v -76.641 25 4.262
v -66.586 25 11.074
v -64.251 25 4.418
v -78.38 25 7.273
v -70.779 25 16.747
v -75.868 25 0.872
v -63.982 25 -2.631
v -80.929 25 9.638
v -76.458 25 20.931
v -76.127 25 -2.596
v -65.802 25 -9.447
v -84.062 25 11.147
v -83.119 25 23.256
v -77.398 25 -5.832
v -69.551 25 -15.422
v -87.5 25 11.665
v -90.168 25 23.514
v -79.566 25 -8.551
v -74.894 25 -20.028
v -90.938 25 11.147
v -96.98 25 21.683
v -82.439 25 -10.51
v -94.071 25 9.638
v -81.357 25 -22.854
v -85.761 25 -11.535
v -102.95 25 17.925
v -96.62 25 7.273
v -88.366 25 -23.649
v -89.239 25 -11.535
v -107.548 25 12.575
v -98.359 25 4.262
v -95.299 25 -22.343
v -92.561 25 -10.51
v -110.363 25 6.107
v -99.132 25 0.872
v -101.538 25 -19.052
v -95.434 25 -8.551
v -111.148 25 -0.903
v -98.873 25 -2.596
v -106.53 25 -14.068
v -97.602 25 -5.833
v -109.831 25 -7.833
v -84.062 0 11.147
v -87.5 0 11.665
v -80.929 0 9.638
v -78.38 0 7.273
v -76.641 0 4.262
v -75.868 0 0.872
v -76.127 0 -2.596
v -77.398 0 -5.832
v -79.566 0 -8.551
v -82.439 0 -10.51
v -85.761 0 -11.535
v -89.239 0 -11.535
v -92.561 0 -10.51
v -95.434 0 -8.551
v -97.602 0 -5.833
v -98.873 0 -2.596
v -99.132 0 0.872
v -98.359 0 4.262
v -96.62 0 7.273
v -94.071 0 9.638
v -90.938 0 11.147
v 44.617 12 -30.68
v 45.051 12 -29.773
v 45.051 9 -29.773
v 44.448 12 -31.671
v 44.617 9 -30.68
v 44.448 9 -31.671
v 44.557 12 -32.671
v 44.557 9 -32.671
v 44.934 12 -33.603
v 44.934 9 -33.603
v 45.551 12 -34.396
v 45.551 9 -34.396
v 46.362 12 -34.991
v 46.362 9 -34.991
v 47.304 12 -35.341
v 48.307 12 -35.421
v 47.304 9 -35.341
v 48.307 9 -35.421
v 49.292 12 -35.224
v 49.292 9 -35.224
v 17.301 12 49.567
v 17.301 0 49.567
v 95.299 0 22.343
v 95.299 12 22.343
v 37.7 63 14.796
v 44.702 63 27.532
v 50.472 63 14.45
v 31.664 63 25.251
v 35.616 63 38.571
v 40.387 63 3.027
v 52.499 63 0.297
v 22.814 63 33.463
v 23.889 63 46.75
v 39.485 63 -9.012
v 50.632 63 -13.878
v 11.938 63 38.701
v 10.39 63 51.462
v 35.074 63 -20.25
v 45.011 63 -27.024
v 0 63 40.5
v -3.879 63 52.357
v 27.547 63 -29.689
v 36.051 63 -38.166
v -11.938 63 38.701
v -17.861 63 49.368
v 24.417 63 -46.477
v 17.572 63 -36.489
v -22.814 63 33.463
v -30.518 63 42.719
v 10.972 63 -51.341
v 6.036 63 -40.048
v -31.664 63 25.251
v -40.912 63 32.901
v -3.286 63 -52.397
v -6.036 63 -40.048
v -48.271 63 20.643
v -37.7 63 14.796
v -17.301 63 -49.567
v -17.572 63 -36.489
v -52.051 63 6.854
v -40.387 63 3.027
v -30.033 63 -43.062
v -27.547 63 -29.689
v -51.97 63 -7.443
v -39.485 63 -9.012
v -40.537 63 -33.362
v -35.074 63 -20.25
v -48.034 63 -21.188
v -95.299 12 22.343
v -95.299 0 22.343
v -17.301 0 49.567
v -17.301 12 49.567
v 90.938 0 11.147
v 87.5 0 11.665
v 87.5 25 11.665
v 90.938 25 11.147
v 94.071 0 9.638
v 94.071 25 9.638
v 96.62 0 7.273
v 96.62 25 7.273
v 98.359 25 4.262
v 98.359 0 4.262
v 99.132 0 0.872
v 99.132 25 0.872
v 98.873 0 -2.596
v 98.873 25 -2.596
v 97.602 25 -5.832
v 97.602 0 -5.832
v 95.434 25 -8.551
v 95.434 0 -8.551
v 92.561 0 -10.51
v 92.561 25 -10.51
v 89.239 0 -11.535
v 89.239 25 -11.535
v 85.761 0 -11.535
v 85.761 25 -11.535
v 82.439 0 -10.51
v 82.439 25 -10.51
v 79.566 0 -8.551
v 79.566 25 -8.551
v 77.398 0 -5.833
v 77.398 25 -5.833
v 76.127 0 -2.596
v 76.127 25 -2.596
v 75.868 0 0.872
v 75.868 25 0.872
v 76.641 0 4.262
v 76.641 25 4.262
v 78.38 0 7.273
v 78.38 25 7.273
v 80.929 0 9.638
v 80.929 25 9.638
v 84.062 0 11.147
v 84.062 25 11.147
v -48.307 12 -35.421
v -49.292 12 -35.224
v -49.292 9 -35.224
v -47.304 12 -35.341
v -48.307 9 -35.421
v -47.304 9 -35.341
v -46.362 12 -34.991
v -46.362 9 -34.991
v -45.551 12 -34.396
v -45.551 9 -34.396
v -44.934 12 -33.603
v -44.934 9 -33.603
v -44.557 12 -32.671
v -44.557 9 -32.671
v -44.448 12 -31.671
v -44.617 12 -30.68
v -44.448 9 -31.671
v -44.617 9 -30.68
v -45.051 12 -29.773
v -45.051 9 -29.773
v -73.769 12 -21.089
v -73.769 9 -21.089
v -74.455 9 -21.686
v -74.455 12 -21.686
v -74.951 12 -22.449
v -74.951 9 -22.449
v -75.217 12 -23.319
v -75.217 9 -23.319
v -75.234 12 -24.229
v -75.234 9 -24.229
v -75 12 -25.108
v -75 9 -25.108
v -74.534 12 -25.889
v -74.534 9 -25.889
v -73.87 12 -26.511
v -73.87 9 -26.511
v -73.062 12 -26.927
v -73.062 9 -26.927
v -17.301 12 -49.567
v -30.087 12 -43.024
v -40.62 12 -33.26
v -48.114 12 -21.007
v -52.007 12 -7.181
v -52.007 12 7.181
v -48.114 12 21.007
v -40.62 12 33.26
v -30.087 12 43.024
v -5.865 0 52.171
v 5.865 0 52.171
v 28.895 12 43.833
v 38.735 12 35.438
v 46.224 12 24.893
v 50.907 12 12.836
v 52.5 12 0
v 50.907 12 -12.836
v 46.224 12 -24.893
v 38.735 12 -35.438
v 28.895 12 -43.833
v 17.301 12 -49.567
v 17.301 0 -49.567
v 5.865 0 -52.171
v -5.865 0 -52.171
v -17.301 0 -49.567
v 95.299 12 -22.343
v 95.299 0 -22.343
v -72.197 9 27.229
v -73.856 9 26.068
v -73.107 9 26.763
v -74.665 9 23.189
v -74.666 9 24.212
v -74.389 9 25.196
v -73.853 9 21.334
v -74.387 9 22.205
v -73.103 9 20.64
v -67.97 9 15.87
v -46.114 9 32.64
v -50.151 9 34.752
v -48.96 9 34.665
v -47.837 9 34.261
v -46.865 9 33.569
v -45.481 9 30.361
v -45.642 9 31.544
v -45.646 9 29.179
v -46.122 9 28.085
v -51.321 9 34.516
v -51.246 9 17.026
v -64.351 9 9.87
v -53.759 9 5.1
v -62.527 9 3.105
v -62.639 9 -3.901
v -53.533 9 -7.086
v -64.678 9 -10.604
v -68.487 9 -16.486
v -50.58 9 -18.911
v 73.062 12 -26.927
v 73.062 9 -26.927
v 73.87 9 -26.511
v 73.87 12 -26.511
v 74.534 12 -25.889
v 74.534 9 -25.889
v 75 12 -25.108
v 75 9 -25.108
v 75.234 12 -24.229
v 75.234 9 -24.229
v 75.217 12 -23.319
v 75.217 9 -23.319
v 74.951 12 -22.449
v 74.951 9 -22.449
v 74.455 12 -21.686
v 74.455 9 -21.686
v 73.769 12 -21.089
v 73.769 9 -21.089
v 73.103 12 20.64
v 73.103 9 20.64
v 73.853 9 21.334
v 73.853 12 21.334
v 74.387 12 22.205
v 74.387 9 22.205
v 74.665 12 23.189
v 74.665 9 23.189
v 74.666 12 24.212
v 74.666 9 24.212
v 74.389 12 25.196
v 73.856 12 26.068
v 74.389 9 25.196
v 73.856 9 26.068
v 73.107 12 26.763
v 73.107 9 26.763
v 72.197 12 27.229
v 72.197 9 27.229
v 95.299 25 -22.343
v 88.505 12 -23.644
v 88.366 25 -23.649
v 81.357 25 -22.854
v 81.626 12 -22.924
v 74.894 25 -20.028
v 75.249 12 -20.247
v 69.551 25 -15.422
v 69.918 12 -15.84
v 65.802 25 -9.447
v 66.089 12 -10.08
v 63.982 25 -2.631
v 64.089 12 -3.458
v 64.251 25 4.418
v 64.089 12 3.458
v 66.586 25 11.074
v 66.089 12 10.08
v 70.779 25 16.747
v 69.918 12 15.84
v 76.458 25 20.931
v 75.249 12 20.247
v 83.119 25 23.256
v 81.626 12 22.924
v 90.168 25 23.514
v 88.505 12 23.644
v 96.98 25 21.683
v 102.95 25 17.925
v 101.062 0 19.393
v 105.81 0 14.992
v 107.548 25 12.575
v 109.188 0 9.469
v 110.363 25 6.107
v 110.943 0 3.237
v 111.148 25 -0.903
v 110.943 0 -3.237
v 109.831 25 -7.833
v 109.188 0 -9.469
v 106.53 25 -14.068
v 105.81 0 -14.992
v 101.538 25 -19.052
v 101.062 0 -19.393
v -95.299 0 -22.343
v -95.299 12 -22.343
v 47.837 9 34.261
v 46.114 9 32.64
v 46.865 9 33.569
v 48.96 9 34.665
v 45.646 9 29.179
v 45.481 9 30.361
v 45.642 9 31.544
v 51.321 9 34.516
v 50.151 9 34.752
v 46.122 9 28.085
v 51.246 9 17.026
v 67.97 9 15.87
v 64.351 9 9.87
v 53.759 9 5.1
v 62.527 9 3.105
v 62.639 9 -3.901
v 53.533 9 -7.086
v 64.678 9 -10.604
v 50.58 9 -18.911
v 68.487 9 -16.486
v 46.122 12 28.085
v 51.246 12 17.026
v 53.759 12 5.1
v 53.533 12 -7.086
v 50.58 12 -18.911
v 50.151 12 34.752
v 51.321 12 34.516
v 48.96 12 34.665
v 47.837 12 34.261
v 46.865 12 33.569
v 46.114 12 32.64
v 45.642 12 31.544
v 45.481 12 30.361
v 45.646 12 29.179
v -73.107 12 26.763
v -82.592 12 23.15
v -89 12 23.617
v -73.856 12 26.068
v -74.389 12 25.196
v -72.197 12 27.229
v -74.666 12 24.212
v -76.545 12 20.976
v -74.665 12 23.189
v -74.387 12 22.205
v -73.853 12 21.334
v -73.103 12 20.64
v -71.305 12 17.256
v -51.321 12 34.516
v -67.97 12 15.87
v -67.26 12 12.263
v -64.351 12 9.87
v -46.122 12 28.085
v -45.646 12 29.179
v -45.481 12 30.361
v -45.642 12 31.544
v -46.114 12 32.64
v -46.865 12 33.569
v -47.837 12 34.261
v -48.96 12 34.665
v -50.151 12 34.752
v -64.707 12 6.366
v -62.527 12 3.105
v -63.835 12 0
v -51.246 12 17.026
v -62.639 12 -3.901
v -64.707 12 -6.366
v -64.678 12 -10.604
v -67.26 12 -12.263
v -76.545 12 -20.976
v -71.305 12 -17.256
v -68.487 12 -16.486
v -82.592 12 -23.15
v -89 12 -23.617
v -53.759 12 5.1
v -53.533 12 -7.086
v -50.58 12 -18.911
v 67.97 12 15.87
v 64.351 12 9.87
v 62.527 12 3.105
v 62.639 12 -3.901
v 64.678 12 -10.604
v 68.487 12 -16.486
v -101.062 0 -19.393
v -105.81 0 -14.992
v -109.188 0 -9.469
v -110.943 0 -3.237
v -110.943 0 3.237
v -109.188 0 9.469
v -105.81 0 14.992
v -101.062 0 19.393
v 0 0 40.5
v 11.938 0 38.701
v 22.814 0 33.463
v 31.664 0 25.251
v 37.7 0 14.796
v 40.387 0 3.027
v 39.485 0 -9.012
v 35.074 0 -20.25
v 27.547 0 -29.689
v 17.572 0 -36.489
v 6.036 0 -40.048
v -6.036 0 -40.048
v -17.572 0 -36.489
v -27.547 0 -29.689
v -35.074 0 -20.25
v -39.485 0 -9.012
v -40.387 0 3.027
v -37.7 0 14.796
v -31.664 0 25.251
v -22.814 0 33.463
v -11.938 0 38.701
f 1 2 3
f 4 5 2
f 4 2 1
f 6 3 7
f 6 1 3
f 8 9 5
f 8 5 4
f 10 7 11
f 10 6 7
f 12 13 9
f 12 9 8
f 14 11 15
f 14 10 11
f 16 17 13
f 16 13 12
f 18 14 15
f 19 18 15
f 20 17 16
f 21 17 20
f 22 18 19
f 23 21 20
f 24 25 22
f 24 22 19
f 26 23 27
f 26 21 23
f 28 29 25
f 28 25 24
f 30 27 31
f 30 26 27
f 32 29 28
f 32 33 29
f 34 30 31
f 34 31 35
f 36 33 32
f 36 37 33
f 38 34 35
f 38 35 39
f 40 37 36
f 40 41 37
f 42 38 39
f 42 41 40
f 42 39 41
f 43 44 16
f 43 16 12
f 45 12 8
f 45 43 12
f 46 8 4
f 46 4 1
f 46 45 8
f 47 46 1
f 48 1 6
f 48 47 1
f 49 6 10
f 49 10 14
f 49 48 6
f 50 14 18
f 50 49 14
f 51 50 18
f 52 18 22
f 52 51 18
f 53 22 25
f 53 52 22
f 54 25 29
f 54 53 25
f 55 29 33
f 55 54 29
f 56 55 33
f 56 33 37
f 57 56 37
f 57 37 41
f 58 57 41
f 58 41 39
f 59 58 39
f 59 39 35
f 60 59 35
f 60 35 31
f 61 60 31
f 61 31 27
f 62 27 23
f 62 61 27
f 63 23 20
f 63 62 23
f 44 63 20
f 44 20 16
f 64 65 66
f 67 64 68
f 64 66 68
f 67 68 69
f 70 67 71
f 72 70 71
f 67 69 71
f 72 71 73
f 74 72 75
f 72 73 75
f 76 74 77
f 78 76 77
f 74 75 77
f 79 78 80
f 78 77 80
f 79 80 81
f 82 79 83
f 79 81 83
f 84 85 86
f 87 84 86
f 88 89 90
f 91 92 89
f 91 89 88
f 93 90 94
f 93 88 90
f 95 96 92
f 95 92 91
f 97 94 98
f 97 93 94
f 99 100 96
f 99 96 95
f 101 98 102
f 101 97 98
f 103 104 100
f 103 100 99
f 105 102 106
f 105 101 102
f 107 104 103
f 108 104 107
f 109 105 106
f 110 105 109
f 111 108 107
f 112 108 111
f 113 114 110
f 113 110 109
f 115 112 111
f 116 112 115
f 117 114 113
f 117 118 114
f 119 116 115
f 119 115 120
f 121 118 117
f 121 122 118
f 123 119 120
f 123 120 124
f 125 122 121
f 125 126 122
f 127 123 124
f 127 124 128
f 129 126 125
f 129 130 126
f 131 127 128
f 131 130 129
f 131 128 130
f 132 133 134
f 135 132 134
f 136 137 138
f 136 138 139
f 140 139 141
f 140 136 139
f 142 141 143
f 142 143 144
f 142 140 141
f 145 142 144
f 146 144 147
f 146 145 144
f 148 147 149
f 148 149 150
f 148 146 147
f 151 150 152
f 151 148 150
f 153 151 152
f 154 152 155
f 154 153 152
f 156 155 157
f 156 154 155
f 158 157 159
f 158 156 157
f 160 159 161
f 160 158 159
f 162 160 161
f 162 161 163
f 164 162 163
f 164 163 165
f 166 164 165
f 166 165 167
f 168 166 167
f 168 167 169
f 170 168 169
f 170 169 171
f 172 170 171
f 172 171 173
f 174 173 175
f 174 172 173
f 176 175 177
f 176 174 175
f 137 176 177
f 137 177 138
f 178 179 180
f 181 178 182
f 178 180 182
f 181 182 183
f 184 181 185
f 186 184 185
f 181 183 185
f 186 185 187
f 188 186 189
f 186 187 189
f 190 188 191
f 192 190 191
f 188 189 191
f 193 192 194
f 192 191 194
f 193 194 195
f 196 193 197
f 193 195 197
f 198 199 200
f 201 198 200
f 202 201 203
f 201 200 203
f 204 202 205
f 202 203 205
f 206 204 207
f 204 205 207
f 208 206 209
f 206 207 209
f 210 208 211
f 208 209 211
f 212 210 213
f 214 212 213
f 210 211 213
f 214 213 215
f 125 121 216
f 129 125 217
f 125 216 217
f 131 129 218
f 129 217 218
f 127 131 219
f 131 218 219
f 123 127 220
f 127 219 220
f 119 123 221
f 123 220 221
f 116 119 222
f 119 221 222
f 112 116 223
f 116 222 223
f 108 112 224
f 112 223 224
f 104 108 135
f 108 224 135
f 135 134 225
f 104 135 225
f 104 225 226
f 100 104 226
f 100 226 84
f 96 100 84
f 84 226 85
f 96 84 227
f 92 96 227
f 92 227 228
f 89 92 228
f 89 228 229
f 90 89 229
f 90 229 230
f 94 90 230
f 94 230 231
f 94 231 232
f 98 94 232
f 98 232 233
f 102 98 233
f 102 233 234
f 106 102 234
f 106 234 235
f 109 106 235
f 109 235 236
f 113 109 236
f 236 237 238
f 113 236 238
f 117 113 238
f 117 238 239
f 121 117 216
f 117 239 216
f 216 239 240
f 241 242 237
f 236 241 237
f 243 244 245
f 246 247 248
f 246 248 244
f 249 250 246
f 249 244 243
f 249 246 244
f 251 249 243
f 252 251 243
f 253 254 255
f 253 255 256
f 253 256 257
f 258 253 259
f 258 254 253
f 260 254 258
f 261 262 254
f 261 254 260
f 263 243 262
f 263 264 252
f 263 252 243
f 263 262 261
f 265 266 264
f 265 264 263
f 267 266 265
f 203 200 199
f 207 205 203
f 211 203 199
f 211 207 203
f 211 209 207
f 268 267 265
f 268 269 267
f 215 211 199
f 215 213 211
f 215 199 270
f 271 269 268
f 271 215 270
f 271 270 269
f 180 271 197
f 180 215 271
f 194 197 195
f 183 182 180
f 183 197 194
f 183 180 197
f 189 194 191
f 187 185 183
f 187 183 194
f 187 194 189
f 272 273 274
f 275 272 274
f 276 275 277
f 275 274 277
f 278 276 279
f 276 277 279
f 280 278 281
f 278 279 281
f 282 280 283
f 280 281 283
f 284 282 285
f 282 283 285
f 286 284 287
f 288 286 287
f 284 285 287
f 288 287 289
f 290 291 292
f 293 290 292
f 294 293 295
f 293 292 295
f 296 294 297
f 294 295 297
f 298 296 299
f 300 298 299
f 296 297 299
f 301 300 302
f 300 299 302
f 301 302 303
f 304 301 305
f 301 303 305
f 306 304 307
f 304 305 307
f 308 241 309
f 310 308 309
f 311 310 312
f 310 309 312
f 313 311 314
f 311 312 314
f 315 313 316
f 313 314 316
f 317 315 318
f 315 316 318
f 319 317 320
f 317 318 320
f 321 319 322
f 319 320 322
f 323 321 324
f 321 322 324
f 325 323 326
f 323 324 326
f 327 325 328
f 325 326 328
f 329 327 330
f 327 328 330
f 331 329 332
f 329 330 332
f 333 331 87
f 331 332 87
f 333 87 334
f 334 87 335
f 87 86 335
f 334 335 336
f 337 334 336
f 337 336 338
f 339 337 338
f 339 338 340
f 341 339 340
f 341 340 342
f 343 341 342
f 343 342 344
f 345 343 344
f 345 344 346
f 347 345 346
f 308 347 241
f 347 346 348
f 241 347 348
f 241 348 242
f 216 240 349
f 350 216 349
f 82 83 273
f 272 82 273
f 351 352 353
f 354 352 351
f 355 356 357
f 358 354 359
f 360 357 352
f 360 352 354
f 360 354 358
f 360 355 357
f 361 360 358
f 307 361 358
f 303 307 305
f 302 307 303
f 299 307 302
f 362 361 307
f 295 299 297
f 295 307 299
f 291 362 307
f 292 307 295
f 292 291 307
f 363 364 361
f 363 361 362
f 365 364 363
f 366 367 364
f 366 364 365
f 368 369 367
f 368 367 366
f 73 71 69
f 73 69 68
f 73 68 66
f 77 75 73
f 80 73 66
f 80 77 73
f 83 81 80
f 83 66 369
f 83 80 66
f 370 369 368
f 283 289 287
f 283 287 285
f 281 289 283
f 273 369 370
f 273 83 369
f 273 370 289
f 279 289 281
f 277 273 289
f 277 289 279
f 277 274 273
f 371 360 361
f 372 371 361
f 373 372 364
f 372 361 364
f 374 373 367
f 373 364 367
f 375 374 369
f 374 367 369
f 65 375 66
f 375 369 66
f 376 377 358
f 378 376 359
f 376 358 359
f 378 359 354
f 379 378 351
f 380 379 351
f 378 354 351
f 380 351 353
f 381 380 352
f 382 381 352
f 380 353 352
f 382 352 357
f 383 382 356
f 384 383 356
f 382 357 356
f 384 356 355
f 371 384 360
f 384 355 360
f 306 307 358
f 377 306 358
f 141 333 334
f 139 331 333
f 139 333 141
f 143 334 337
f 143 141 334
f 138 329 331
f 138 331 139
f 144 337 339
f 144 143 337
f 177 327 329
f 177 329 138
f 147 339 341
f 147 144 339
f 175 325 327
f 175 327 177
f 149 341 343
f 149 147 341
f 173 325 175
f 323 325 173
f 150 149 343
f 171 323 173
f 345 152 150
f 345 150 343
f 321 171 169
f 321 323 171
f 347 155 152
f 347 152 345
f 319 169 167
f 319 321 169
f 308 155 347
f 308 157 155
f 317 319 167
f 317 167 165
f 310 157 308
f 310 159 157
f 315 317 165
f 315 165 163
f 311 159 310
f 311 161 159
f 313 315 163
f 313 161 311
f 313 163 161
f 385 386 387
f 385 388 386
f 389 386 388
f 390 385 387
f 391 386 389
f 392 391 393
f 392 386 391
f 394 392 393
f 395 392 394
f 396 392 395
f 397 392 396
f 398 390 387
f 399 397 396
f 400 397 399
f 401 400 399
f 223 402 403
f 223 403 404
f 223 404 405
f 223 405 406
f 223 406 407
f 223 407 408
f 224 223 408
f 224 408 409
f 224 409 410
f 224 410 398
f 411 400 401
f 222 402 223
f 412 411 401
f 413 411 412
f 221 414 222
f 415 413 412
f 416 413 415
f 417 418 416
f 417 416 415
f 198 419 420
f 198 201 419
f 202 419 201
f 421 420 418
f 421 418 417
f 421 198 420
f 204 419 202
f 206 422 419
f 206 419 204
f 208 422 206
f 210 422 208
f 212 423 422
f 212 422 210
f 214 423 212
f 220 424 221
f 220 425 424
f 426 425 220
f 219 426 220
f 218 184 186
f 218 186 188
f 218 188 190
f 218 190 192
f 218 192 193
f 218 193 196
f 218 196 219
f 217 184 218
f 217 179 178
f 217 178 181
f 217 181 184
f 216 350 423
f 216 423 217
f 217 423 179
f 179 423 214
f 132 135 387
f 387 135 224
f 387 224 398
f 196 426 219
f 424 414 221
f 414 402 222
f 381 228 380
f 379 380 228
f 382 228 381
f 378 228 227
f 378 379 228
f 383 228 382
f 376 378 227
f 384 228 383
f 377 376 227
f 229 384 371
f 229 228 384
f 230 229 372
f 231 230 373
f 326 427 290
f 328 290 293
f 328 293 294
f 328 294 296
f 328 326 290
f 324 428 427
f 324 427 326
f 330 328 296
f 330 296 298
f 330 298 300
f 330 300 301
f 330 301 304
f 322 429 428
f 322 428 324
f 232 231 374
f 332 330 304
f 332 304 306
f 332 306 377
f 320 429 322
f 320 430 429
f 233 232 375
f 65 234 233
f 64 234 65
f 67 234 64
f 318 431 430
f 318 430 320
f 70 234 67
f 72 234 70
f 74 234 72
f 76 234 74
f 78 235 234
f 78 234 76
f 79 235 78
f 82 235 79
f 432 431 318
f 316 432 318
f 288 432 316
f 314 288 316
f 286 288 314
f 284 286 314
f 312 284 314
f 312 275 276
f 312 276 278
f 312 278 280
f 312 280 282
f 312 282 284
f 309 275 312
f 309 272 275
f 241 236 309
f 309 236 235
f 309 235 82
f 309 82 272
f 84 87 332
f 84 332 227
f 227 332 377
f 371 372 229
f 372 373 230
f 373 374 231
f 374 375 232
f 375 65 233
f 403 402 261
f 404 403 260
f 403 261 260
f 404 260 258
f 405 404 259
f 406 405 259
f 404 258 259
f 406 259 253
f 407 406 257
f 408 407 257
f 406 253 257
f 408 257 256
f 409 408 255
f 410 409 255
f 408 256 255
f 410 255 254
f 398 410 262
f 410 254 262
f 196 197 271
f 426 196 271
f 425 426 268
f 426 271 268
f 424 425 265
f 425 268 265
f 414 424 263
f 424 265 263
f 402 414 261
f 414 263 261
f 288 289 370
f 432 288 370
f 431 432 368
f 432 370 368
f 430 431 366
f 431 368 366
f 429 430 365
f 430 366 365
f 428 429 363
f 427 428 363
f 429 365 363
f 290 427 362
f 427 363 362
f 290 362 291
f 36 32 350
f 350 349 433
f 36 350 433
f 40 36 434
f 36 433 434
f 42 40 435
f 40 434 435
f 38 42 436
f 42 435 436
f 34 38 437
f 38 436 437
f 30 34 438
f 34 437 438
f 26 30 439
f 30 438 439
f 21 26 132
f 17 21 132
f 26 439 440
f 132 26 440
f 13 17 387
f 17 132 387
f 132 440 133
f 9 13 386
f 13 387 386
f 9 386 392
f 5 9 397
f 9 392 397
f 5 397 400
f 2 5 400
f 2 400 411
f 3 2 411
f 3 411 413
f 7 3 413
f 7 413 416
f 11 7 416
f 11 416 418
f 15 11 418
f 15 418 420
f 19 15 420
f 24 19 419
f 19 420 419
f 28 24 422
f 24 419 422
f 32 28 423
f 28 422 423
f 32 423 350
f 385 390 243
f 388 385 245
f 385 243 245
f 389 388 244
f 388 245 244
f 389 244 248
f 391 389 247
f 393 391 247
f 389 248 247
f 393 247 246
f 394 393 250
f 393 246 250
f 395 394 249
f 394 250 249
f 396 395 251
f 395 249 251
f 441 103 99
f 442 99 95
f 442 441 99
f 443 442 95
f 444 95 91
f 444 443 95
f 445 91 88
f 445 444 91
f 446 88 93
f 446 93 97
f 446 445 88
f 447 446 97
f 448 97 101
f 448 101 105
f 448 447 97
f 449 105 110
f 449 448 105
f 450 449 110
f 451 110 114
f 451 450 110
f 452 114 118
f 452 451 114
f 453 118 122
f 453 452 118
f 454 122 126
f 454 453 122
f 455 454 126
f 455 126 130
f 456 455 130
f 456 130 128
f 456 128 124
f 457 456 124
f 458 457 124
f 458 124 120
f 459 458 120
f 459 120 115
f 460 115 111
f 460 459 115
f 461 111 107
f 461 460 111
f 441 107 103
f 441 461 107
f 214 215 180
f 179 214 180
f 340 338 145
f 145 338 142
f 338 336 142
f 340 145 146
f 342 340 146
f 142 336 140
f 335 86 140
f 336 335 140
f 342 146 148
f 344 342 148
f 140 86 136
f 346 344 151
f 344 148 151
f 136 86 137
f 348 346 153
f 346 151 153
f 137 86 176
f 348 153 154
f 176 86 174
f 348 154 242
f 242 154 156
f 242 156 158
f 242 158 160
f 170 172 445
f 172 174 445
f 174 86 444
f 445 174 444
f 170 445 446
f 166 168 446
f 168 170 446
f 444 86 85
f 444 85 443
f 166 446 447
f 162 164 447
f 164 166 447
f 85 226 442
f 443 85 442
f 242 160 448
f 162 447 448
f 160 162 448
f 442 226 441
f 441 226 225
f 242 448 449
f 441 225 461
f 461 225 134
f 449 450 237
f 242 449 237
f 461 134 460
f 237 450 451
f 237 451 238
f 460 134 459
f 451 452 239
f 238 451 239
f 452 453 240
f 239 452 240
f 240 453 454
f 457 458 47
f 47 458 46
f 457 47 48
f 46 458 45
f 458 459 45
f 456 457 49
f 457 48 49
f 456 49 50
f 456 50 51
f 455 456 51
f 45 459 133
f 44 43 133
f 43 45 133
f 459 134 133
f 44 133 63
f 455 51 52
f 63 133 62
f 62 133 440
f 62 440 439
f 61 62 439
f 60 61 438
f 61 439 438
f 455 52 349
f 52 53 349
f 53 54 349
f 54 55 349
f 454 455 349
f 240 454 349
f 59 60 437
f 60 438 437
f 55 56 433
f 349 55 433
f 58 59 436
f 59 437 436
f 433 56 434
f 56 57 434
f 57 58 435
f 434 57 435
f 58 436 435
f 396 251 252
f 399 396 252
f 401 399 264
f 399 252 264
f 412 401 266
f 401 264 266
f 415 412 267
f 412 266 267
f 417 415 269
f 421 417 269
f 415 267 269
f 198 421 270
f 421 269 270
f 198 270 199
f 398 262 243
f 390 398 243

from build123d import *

# Parameters (mm, degrees)
BOSS_EXTRUDE1_DEPTH   = 12
BOSS_EXTRUDE1_2_DEPTH = 12
BOSS_EXTRUDE2_DEPTH   = 9
SKETCH1_4_R           = 40.5
BOSS_EXTRUDE3_DEPTH   = 63
SKETCH1_5_R           = 23.665
SKETCH1_5_R_2         = 11.665
BOSS_EXTRUDE4_DEPTH   = 25


with BuildPart() as part:
    # Sketch1 → Boss-Extrude1 (new body)
    with BuildSketch(Plane(origin=(0, 0, 0), x_dir=(1, 0, 0), z_dir=(0, 1, 0))):
        with BuildLine():
            ThreePointArc((-17.301, -49.56738241), (-52.5, 0), (-17.301, 49.56738241))
            Line((-17.301, 49.56738241), (-95.298631714, 22.343087709))
            ThreePointArc((-95.298631714, 22.343087709), (-63.835, 0), (-95.298631714, -22.343087709))
            Line((-95.298631714, -22.343087709), (-17.301, -49.56738241))
        make_face()
        with BuildLine():
            Line((-73.061565244, 26.927220983), (-49.292435481, 35.22359844))
            ThreePointArc((-49.292435481, 35.22359844), (-45.21504533, 34.020913269), (-45.050715916, 29.773024628))
            ThreePointArc((-45.050715916, 29.773024628), (-53.990744033, 0.999779365), (-46.122102919, -28.084722223))
            ThreePointArc((-46.122102919, -28.084722223), (-46.457803099, -33.130049608), (-51.320741116, -34.515638607))
            Line((-51.320741116, -34.515638607), (-72.196764974, -27.229070884))
            ThreePointArc((-72.196764974, -27.229070884), (-74.665998298, -24.211578828), (-73.102729075, -20.639666056))
            ThreePointArc((-73.102729075, -20.639666056), (-62.338211107, 0.40200089), (-73.769413903, 21.089054754))
            ThreePointArc((-73.769413903, 21.089054754), (-75.234080861, 24.22863303), (-73.061565244, 26.927220983))
        make_face(mode=Mode.SUBTRACT)
    extrude(amount=BOSS_EXTRUDE1_DEPTH)



with BuildPart() as body_2:
    # Sketch1 → Boss-Extrude1 2 (new body)
    with BuildSketch(Plane(origin=(0, 0, 0), x_dir=(1, 0, 0), z_dir=(0, 1, 0))):
        with BuildLine():
            Line((95.298631714, 22.343087709), (17.301, 49.56738241))
            ThreePointArc((17.301, 49.56738241), (52.5, 0), (17.301, -49.56738241))
            Line((17.301, -49.56738241), (95.298631714, -22.343087709))
            ThreePointArc((95.298631714, -22.343087709), (63.835, 0), (95.298631714, 22.343087709))
        make_face()
        with BuildLine():
            ThreePointArc((73.102729075, -20.639666056), (74.665998298, -24.211578828), (72.196764974, -27.229070884))
            Line((72.196764974, -27.229070884), (51.320741116, -34.515638607))
            ThreePointArc((51.320741116, -34.515638607), (46.457803099, -33.130049608), (46.122102919, -28.084722223))
            ThreePointArc((46.122102919, -28.084722223), (53.990744033, 0.999779365), (45.050715916, 29.773024628))
            ThreePointArc((45.050715916, 29.773024628), (45.21504533, 34.020913269), (49.292435481, 35.22359844))
            Line((49.292435481, 35.22359844), (73.061565244, 26.927220983))
            ThreePointArc((73.061565244, 26.927220983), (75.234080861, 24.22863303), (73.769413903, 21.089054754))
            ThreePointArc((73.769413903, 21.089054754), (62.338211107, 0.40200089), (73.102729075, -20.639666056))
        make_face(mode=Mode.SUBTRACT)
    extrude(amount=BOSS_EXTRUDE1_2_DEPTH)


with BuildPart() as part_1:
    add(part.part)

    add(body_2.part)  # Boss-Extrude2 merges body 2
    # Sketch1<3> → Boss-Extrude2 (add)
    with BuildSketch(Plane(origin=(0, 0, 0), x_dir=(1, 0, 0), z_dir=(0, 1, 0))):
        with BuildLine():
            ThreePointArc((-45.050715916, 29.773024628), (-45.21504533, 34.020913269), (-49.292435481, 35.22359844))
            Line((-49.292435481, 35.22359844), (-73.061565244, 26.927220983))
            ThreePointArc((-73.061565244, 26.927220983), (-75.234080861, 24.22863303), (-73.769413903, 21.089054754))
            ThreePointArc((-73.769413903, 21.089054754), (-62.338211107, 0.40200089), (-73.102729075, -20.639666056))
            ThreePointArc((-73.102729075, -20.639666056), (-74.665998298, -24.211578828), (-72.196764974, -27.229070884))
            Line((-72.196764974, -27.229070884), (-51.320741116, -34.515638607))
            ThreePointArc((-51.320741116, -34.515638607), (-46.457803099, -33.130049608), (-46.122102919, -28.084722223))
            ThreePointArc((-46.122102919, -28.084722223), (-53.990744033, 0.999779365), (-45.050715916, 29.773024628))
        make_face()
        with BuildLine():
            Line((51.320741116, -34.515638607), (72.196764974, -27.229070884))
            ThreePointArc((72.196764974, -27.229070884), (74.665998298, -24.211578828), (73.102729075, -20.639666056))
            ThreePointArc((73.102729075, -20.639666056), (62.338211107, 0.40200089), (73.769413903, 21.089054754))
            ThreePointArc((73.769413903, 21.089054754), (75.234080861, 24.22863303), (73.061565244, 26.927220983))
            Line((73.061565244, 26.927220983), (49.292435481, 35.22359844))
            ThreePointArc((49.292435481, 35.22359844), (45.21504533, 34.020913269), (45.050715916, 29.773024628))
            ThreePointArc((45.050715916, 29.773024628), (53.990744033, 0.999779365), (46.122102919, -28.084722223))
            ThreePointArc((46.122102919, -28.084722223), (46.457803099, -33.130049608), (51.320741116, -34.515638607))
        make_face()
    extrude(amount=BOSS_EXTRUDE2_DEPTH)

    # Sketch1<4> → Boss-Extrude3 (add)
    with BuildSketch(Plane(origin=(0, 0, 0), x_dir=(1, 0, 0), z_dir=(0, 1, 0))):
        with BuildLine():
            ThreePointArc((17.301, 49.56738241), (0, 52.5), (-17.301, 49.56738241))
            ThreePointArc((-17.301, 49.56738241), (-52.5, 0), (-17.301, -49.56738241))
            ThreePointArc((-17.301, -49.56738241), (0, -52.5), (17.301, -49.56738241))
            ThreePointArc((17.301, -49.56738241), (42.805096075, -30.396936523), (52.5, 0))
            ThreePointArc((52.5, 0), (42.805096075, 30.396936523), (17.301, 49.56738241))
        make_face()
        Circle(SKETCH1_4_R, mode=Mode.SUBTRACT)
    extrude(amount=BOSS_EXTRUDE3_DEPTH)

    # Sketch1<5> → Boss-Extrude4 (add)
    # profile 1 of 2: a face of its own
    with BuildSketch(Plane(origin=(0, 0, 0), x_dir=(1, 0, 0), z_dir=(0, 1, 0))):
        with Locations((-87.5, 0)):
            Circle(SKETCH1_5_R)
        with Locations((-87.5, 0)):
            Circle(SKETCH1_5_R_2, mode=Mode.SUBTRACT)
    # profile 2 of 2: a face of its own
    with BuildSketch(Plane(origin=(0, 0, 0), x_dir=(1, 0, 0), z_dir=(0, 1, 0))):
        with Locations((87.5, 0)):
            Circle(SKETCH1_5_R)
        with Locations((87.5, 0)):
            Circle(SKETCH1_5_R_2, mode=Mode.SUBTRACT)
    extrude(amount=BOSS_EXTRUDE4_DEPTH)


solid = part_1.part
